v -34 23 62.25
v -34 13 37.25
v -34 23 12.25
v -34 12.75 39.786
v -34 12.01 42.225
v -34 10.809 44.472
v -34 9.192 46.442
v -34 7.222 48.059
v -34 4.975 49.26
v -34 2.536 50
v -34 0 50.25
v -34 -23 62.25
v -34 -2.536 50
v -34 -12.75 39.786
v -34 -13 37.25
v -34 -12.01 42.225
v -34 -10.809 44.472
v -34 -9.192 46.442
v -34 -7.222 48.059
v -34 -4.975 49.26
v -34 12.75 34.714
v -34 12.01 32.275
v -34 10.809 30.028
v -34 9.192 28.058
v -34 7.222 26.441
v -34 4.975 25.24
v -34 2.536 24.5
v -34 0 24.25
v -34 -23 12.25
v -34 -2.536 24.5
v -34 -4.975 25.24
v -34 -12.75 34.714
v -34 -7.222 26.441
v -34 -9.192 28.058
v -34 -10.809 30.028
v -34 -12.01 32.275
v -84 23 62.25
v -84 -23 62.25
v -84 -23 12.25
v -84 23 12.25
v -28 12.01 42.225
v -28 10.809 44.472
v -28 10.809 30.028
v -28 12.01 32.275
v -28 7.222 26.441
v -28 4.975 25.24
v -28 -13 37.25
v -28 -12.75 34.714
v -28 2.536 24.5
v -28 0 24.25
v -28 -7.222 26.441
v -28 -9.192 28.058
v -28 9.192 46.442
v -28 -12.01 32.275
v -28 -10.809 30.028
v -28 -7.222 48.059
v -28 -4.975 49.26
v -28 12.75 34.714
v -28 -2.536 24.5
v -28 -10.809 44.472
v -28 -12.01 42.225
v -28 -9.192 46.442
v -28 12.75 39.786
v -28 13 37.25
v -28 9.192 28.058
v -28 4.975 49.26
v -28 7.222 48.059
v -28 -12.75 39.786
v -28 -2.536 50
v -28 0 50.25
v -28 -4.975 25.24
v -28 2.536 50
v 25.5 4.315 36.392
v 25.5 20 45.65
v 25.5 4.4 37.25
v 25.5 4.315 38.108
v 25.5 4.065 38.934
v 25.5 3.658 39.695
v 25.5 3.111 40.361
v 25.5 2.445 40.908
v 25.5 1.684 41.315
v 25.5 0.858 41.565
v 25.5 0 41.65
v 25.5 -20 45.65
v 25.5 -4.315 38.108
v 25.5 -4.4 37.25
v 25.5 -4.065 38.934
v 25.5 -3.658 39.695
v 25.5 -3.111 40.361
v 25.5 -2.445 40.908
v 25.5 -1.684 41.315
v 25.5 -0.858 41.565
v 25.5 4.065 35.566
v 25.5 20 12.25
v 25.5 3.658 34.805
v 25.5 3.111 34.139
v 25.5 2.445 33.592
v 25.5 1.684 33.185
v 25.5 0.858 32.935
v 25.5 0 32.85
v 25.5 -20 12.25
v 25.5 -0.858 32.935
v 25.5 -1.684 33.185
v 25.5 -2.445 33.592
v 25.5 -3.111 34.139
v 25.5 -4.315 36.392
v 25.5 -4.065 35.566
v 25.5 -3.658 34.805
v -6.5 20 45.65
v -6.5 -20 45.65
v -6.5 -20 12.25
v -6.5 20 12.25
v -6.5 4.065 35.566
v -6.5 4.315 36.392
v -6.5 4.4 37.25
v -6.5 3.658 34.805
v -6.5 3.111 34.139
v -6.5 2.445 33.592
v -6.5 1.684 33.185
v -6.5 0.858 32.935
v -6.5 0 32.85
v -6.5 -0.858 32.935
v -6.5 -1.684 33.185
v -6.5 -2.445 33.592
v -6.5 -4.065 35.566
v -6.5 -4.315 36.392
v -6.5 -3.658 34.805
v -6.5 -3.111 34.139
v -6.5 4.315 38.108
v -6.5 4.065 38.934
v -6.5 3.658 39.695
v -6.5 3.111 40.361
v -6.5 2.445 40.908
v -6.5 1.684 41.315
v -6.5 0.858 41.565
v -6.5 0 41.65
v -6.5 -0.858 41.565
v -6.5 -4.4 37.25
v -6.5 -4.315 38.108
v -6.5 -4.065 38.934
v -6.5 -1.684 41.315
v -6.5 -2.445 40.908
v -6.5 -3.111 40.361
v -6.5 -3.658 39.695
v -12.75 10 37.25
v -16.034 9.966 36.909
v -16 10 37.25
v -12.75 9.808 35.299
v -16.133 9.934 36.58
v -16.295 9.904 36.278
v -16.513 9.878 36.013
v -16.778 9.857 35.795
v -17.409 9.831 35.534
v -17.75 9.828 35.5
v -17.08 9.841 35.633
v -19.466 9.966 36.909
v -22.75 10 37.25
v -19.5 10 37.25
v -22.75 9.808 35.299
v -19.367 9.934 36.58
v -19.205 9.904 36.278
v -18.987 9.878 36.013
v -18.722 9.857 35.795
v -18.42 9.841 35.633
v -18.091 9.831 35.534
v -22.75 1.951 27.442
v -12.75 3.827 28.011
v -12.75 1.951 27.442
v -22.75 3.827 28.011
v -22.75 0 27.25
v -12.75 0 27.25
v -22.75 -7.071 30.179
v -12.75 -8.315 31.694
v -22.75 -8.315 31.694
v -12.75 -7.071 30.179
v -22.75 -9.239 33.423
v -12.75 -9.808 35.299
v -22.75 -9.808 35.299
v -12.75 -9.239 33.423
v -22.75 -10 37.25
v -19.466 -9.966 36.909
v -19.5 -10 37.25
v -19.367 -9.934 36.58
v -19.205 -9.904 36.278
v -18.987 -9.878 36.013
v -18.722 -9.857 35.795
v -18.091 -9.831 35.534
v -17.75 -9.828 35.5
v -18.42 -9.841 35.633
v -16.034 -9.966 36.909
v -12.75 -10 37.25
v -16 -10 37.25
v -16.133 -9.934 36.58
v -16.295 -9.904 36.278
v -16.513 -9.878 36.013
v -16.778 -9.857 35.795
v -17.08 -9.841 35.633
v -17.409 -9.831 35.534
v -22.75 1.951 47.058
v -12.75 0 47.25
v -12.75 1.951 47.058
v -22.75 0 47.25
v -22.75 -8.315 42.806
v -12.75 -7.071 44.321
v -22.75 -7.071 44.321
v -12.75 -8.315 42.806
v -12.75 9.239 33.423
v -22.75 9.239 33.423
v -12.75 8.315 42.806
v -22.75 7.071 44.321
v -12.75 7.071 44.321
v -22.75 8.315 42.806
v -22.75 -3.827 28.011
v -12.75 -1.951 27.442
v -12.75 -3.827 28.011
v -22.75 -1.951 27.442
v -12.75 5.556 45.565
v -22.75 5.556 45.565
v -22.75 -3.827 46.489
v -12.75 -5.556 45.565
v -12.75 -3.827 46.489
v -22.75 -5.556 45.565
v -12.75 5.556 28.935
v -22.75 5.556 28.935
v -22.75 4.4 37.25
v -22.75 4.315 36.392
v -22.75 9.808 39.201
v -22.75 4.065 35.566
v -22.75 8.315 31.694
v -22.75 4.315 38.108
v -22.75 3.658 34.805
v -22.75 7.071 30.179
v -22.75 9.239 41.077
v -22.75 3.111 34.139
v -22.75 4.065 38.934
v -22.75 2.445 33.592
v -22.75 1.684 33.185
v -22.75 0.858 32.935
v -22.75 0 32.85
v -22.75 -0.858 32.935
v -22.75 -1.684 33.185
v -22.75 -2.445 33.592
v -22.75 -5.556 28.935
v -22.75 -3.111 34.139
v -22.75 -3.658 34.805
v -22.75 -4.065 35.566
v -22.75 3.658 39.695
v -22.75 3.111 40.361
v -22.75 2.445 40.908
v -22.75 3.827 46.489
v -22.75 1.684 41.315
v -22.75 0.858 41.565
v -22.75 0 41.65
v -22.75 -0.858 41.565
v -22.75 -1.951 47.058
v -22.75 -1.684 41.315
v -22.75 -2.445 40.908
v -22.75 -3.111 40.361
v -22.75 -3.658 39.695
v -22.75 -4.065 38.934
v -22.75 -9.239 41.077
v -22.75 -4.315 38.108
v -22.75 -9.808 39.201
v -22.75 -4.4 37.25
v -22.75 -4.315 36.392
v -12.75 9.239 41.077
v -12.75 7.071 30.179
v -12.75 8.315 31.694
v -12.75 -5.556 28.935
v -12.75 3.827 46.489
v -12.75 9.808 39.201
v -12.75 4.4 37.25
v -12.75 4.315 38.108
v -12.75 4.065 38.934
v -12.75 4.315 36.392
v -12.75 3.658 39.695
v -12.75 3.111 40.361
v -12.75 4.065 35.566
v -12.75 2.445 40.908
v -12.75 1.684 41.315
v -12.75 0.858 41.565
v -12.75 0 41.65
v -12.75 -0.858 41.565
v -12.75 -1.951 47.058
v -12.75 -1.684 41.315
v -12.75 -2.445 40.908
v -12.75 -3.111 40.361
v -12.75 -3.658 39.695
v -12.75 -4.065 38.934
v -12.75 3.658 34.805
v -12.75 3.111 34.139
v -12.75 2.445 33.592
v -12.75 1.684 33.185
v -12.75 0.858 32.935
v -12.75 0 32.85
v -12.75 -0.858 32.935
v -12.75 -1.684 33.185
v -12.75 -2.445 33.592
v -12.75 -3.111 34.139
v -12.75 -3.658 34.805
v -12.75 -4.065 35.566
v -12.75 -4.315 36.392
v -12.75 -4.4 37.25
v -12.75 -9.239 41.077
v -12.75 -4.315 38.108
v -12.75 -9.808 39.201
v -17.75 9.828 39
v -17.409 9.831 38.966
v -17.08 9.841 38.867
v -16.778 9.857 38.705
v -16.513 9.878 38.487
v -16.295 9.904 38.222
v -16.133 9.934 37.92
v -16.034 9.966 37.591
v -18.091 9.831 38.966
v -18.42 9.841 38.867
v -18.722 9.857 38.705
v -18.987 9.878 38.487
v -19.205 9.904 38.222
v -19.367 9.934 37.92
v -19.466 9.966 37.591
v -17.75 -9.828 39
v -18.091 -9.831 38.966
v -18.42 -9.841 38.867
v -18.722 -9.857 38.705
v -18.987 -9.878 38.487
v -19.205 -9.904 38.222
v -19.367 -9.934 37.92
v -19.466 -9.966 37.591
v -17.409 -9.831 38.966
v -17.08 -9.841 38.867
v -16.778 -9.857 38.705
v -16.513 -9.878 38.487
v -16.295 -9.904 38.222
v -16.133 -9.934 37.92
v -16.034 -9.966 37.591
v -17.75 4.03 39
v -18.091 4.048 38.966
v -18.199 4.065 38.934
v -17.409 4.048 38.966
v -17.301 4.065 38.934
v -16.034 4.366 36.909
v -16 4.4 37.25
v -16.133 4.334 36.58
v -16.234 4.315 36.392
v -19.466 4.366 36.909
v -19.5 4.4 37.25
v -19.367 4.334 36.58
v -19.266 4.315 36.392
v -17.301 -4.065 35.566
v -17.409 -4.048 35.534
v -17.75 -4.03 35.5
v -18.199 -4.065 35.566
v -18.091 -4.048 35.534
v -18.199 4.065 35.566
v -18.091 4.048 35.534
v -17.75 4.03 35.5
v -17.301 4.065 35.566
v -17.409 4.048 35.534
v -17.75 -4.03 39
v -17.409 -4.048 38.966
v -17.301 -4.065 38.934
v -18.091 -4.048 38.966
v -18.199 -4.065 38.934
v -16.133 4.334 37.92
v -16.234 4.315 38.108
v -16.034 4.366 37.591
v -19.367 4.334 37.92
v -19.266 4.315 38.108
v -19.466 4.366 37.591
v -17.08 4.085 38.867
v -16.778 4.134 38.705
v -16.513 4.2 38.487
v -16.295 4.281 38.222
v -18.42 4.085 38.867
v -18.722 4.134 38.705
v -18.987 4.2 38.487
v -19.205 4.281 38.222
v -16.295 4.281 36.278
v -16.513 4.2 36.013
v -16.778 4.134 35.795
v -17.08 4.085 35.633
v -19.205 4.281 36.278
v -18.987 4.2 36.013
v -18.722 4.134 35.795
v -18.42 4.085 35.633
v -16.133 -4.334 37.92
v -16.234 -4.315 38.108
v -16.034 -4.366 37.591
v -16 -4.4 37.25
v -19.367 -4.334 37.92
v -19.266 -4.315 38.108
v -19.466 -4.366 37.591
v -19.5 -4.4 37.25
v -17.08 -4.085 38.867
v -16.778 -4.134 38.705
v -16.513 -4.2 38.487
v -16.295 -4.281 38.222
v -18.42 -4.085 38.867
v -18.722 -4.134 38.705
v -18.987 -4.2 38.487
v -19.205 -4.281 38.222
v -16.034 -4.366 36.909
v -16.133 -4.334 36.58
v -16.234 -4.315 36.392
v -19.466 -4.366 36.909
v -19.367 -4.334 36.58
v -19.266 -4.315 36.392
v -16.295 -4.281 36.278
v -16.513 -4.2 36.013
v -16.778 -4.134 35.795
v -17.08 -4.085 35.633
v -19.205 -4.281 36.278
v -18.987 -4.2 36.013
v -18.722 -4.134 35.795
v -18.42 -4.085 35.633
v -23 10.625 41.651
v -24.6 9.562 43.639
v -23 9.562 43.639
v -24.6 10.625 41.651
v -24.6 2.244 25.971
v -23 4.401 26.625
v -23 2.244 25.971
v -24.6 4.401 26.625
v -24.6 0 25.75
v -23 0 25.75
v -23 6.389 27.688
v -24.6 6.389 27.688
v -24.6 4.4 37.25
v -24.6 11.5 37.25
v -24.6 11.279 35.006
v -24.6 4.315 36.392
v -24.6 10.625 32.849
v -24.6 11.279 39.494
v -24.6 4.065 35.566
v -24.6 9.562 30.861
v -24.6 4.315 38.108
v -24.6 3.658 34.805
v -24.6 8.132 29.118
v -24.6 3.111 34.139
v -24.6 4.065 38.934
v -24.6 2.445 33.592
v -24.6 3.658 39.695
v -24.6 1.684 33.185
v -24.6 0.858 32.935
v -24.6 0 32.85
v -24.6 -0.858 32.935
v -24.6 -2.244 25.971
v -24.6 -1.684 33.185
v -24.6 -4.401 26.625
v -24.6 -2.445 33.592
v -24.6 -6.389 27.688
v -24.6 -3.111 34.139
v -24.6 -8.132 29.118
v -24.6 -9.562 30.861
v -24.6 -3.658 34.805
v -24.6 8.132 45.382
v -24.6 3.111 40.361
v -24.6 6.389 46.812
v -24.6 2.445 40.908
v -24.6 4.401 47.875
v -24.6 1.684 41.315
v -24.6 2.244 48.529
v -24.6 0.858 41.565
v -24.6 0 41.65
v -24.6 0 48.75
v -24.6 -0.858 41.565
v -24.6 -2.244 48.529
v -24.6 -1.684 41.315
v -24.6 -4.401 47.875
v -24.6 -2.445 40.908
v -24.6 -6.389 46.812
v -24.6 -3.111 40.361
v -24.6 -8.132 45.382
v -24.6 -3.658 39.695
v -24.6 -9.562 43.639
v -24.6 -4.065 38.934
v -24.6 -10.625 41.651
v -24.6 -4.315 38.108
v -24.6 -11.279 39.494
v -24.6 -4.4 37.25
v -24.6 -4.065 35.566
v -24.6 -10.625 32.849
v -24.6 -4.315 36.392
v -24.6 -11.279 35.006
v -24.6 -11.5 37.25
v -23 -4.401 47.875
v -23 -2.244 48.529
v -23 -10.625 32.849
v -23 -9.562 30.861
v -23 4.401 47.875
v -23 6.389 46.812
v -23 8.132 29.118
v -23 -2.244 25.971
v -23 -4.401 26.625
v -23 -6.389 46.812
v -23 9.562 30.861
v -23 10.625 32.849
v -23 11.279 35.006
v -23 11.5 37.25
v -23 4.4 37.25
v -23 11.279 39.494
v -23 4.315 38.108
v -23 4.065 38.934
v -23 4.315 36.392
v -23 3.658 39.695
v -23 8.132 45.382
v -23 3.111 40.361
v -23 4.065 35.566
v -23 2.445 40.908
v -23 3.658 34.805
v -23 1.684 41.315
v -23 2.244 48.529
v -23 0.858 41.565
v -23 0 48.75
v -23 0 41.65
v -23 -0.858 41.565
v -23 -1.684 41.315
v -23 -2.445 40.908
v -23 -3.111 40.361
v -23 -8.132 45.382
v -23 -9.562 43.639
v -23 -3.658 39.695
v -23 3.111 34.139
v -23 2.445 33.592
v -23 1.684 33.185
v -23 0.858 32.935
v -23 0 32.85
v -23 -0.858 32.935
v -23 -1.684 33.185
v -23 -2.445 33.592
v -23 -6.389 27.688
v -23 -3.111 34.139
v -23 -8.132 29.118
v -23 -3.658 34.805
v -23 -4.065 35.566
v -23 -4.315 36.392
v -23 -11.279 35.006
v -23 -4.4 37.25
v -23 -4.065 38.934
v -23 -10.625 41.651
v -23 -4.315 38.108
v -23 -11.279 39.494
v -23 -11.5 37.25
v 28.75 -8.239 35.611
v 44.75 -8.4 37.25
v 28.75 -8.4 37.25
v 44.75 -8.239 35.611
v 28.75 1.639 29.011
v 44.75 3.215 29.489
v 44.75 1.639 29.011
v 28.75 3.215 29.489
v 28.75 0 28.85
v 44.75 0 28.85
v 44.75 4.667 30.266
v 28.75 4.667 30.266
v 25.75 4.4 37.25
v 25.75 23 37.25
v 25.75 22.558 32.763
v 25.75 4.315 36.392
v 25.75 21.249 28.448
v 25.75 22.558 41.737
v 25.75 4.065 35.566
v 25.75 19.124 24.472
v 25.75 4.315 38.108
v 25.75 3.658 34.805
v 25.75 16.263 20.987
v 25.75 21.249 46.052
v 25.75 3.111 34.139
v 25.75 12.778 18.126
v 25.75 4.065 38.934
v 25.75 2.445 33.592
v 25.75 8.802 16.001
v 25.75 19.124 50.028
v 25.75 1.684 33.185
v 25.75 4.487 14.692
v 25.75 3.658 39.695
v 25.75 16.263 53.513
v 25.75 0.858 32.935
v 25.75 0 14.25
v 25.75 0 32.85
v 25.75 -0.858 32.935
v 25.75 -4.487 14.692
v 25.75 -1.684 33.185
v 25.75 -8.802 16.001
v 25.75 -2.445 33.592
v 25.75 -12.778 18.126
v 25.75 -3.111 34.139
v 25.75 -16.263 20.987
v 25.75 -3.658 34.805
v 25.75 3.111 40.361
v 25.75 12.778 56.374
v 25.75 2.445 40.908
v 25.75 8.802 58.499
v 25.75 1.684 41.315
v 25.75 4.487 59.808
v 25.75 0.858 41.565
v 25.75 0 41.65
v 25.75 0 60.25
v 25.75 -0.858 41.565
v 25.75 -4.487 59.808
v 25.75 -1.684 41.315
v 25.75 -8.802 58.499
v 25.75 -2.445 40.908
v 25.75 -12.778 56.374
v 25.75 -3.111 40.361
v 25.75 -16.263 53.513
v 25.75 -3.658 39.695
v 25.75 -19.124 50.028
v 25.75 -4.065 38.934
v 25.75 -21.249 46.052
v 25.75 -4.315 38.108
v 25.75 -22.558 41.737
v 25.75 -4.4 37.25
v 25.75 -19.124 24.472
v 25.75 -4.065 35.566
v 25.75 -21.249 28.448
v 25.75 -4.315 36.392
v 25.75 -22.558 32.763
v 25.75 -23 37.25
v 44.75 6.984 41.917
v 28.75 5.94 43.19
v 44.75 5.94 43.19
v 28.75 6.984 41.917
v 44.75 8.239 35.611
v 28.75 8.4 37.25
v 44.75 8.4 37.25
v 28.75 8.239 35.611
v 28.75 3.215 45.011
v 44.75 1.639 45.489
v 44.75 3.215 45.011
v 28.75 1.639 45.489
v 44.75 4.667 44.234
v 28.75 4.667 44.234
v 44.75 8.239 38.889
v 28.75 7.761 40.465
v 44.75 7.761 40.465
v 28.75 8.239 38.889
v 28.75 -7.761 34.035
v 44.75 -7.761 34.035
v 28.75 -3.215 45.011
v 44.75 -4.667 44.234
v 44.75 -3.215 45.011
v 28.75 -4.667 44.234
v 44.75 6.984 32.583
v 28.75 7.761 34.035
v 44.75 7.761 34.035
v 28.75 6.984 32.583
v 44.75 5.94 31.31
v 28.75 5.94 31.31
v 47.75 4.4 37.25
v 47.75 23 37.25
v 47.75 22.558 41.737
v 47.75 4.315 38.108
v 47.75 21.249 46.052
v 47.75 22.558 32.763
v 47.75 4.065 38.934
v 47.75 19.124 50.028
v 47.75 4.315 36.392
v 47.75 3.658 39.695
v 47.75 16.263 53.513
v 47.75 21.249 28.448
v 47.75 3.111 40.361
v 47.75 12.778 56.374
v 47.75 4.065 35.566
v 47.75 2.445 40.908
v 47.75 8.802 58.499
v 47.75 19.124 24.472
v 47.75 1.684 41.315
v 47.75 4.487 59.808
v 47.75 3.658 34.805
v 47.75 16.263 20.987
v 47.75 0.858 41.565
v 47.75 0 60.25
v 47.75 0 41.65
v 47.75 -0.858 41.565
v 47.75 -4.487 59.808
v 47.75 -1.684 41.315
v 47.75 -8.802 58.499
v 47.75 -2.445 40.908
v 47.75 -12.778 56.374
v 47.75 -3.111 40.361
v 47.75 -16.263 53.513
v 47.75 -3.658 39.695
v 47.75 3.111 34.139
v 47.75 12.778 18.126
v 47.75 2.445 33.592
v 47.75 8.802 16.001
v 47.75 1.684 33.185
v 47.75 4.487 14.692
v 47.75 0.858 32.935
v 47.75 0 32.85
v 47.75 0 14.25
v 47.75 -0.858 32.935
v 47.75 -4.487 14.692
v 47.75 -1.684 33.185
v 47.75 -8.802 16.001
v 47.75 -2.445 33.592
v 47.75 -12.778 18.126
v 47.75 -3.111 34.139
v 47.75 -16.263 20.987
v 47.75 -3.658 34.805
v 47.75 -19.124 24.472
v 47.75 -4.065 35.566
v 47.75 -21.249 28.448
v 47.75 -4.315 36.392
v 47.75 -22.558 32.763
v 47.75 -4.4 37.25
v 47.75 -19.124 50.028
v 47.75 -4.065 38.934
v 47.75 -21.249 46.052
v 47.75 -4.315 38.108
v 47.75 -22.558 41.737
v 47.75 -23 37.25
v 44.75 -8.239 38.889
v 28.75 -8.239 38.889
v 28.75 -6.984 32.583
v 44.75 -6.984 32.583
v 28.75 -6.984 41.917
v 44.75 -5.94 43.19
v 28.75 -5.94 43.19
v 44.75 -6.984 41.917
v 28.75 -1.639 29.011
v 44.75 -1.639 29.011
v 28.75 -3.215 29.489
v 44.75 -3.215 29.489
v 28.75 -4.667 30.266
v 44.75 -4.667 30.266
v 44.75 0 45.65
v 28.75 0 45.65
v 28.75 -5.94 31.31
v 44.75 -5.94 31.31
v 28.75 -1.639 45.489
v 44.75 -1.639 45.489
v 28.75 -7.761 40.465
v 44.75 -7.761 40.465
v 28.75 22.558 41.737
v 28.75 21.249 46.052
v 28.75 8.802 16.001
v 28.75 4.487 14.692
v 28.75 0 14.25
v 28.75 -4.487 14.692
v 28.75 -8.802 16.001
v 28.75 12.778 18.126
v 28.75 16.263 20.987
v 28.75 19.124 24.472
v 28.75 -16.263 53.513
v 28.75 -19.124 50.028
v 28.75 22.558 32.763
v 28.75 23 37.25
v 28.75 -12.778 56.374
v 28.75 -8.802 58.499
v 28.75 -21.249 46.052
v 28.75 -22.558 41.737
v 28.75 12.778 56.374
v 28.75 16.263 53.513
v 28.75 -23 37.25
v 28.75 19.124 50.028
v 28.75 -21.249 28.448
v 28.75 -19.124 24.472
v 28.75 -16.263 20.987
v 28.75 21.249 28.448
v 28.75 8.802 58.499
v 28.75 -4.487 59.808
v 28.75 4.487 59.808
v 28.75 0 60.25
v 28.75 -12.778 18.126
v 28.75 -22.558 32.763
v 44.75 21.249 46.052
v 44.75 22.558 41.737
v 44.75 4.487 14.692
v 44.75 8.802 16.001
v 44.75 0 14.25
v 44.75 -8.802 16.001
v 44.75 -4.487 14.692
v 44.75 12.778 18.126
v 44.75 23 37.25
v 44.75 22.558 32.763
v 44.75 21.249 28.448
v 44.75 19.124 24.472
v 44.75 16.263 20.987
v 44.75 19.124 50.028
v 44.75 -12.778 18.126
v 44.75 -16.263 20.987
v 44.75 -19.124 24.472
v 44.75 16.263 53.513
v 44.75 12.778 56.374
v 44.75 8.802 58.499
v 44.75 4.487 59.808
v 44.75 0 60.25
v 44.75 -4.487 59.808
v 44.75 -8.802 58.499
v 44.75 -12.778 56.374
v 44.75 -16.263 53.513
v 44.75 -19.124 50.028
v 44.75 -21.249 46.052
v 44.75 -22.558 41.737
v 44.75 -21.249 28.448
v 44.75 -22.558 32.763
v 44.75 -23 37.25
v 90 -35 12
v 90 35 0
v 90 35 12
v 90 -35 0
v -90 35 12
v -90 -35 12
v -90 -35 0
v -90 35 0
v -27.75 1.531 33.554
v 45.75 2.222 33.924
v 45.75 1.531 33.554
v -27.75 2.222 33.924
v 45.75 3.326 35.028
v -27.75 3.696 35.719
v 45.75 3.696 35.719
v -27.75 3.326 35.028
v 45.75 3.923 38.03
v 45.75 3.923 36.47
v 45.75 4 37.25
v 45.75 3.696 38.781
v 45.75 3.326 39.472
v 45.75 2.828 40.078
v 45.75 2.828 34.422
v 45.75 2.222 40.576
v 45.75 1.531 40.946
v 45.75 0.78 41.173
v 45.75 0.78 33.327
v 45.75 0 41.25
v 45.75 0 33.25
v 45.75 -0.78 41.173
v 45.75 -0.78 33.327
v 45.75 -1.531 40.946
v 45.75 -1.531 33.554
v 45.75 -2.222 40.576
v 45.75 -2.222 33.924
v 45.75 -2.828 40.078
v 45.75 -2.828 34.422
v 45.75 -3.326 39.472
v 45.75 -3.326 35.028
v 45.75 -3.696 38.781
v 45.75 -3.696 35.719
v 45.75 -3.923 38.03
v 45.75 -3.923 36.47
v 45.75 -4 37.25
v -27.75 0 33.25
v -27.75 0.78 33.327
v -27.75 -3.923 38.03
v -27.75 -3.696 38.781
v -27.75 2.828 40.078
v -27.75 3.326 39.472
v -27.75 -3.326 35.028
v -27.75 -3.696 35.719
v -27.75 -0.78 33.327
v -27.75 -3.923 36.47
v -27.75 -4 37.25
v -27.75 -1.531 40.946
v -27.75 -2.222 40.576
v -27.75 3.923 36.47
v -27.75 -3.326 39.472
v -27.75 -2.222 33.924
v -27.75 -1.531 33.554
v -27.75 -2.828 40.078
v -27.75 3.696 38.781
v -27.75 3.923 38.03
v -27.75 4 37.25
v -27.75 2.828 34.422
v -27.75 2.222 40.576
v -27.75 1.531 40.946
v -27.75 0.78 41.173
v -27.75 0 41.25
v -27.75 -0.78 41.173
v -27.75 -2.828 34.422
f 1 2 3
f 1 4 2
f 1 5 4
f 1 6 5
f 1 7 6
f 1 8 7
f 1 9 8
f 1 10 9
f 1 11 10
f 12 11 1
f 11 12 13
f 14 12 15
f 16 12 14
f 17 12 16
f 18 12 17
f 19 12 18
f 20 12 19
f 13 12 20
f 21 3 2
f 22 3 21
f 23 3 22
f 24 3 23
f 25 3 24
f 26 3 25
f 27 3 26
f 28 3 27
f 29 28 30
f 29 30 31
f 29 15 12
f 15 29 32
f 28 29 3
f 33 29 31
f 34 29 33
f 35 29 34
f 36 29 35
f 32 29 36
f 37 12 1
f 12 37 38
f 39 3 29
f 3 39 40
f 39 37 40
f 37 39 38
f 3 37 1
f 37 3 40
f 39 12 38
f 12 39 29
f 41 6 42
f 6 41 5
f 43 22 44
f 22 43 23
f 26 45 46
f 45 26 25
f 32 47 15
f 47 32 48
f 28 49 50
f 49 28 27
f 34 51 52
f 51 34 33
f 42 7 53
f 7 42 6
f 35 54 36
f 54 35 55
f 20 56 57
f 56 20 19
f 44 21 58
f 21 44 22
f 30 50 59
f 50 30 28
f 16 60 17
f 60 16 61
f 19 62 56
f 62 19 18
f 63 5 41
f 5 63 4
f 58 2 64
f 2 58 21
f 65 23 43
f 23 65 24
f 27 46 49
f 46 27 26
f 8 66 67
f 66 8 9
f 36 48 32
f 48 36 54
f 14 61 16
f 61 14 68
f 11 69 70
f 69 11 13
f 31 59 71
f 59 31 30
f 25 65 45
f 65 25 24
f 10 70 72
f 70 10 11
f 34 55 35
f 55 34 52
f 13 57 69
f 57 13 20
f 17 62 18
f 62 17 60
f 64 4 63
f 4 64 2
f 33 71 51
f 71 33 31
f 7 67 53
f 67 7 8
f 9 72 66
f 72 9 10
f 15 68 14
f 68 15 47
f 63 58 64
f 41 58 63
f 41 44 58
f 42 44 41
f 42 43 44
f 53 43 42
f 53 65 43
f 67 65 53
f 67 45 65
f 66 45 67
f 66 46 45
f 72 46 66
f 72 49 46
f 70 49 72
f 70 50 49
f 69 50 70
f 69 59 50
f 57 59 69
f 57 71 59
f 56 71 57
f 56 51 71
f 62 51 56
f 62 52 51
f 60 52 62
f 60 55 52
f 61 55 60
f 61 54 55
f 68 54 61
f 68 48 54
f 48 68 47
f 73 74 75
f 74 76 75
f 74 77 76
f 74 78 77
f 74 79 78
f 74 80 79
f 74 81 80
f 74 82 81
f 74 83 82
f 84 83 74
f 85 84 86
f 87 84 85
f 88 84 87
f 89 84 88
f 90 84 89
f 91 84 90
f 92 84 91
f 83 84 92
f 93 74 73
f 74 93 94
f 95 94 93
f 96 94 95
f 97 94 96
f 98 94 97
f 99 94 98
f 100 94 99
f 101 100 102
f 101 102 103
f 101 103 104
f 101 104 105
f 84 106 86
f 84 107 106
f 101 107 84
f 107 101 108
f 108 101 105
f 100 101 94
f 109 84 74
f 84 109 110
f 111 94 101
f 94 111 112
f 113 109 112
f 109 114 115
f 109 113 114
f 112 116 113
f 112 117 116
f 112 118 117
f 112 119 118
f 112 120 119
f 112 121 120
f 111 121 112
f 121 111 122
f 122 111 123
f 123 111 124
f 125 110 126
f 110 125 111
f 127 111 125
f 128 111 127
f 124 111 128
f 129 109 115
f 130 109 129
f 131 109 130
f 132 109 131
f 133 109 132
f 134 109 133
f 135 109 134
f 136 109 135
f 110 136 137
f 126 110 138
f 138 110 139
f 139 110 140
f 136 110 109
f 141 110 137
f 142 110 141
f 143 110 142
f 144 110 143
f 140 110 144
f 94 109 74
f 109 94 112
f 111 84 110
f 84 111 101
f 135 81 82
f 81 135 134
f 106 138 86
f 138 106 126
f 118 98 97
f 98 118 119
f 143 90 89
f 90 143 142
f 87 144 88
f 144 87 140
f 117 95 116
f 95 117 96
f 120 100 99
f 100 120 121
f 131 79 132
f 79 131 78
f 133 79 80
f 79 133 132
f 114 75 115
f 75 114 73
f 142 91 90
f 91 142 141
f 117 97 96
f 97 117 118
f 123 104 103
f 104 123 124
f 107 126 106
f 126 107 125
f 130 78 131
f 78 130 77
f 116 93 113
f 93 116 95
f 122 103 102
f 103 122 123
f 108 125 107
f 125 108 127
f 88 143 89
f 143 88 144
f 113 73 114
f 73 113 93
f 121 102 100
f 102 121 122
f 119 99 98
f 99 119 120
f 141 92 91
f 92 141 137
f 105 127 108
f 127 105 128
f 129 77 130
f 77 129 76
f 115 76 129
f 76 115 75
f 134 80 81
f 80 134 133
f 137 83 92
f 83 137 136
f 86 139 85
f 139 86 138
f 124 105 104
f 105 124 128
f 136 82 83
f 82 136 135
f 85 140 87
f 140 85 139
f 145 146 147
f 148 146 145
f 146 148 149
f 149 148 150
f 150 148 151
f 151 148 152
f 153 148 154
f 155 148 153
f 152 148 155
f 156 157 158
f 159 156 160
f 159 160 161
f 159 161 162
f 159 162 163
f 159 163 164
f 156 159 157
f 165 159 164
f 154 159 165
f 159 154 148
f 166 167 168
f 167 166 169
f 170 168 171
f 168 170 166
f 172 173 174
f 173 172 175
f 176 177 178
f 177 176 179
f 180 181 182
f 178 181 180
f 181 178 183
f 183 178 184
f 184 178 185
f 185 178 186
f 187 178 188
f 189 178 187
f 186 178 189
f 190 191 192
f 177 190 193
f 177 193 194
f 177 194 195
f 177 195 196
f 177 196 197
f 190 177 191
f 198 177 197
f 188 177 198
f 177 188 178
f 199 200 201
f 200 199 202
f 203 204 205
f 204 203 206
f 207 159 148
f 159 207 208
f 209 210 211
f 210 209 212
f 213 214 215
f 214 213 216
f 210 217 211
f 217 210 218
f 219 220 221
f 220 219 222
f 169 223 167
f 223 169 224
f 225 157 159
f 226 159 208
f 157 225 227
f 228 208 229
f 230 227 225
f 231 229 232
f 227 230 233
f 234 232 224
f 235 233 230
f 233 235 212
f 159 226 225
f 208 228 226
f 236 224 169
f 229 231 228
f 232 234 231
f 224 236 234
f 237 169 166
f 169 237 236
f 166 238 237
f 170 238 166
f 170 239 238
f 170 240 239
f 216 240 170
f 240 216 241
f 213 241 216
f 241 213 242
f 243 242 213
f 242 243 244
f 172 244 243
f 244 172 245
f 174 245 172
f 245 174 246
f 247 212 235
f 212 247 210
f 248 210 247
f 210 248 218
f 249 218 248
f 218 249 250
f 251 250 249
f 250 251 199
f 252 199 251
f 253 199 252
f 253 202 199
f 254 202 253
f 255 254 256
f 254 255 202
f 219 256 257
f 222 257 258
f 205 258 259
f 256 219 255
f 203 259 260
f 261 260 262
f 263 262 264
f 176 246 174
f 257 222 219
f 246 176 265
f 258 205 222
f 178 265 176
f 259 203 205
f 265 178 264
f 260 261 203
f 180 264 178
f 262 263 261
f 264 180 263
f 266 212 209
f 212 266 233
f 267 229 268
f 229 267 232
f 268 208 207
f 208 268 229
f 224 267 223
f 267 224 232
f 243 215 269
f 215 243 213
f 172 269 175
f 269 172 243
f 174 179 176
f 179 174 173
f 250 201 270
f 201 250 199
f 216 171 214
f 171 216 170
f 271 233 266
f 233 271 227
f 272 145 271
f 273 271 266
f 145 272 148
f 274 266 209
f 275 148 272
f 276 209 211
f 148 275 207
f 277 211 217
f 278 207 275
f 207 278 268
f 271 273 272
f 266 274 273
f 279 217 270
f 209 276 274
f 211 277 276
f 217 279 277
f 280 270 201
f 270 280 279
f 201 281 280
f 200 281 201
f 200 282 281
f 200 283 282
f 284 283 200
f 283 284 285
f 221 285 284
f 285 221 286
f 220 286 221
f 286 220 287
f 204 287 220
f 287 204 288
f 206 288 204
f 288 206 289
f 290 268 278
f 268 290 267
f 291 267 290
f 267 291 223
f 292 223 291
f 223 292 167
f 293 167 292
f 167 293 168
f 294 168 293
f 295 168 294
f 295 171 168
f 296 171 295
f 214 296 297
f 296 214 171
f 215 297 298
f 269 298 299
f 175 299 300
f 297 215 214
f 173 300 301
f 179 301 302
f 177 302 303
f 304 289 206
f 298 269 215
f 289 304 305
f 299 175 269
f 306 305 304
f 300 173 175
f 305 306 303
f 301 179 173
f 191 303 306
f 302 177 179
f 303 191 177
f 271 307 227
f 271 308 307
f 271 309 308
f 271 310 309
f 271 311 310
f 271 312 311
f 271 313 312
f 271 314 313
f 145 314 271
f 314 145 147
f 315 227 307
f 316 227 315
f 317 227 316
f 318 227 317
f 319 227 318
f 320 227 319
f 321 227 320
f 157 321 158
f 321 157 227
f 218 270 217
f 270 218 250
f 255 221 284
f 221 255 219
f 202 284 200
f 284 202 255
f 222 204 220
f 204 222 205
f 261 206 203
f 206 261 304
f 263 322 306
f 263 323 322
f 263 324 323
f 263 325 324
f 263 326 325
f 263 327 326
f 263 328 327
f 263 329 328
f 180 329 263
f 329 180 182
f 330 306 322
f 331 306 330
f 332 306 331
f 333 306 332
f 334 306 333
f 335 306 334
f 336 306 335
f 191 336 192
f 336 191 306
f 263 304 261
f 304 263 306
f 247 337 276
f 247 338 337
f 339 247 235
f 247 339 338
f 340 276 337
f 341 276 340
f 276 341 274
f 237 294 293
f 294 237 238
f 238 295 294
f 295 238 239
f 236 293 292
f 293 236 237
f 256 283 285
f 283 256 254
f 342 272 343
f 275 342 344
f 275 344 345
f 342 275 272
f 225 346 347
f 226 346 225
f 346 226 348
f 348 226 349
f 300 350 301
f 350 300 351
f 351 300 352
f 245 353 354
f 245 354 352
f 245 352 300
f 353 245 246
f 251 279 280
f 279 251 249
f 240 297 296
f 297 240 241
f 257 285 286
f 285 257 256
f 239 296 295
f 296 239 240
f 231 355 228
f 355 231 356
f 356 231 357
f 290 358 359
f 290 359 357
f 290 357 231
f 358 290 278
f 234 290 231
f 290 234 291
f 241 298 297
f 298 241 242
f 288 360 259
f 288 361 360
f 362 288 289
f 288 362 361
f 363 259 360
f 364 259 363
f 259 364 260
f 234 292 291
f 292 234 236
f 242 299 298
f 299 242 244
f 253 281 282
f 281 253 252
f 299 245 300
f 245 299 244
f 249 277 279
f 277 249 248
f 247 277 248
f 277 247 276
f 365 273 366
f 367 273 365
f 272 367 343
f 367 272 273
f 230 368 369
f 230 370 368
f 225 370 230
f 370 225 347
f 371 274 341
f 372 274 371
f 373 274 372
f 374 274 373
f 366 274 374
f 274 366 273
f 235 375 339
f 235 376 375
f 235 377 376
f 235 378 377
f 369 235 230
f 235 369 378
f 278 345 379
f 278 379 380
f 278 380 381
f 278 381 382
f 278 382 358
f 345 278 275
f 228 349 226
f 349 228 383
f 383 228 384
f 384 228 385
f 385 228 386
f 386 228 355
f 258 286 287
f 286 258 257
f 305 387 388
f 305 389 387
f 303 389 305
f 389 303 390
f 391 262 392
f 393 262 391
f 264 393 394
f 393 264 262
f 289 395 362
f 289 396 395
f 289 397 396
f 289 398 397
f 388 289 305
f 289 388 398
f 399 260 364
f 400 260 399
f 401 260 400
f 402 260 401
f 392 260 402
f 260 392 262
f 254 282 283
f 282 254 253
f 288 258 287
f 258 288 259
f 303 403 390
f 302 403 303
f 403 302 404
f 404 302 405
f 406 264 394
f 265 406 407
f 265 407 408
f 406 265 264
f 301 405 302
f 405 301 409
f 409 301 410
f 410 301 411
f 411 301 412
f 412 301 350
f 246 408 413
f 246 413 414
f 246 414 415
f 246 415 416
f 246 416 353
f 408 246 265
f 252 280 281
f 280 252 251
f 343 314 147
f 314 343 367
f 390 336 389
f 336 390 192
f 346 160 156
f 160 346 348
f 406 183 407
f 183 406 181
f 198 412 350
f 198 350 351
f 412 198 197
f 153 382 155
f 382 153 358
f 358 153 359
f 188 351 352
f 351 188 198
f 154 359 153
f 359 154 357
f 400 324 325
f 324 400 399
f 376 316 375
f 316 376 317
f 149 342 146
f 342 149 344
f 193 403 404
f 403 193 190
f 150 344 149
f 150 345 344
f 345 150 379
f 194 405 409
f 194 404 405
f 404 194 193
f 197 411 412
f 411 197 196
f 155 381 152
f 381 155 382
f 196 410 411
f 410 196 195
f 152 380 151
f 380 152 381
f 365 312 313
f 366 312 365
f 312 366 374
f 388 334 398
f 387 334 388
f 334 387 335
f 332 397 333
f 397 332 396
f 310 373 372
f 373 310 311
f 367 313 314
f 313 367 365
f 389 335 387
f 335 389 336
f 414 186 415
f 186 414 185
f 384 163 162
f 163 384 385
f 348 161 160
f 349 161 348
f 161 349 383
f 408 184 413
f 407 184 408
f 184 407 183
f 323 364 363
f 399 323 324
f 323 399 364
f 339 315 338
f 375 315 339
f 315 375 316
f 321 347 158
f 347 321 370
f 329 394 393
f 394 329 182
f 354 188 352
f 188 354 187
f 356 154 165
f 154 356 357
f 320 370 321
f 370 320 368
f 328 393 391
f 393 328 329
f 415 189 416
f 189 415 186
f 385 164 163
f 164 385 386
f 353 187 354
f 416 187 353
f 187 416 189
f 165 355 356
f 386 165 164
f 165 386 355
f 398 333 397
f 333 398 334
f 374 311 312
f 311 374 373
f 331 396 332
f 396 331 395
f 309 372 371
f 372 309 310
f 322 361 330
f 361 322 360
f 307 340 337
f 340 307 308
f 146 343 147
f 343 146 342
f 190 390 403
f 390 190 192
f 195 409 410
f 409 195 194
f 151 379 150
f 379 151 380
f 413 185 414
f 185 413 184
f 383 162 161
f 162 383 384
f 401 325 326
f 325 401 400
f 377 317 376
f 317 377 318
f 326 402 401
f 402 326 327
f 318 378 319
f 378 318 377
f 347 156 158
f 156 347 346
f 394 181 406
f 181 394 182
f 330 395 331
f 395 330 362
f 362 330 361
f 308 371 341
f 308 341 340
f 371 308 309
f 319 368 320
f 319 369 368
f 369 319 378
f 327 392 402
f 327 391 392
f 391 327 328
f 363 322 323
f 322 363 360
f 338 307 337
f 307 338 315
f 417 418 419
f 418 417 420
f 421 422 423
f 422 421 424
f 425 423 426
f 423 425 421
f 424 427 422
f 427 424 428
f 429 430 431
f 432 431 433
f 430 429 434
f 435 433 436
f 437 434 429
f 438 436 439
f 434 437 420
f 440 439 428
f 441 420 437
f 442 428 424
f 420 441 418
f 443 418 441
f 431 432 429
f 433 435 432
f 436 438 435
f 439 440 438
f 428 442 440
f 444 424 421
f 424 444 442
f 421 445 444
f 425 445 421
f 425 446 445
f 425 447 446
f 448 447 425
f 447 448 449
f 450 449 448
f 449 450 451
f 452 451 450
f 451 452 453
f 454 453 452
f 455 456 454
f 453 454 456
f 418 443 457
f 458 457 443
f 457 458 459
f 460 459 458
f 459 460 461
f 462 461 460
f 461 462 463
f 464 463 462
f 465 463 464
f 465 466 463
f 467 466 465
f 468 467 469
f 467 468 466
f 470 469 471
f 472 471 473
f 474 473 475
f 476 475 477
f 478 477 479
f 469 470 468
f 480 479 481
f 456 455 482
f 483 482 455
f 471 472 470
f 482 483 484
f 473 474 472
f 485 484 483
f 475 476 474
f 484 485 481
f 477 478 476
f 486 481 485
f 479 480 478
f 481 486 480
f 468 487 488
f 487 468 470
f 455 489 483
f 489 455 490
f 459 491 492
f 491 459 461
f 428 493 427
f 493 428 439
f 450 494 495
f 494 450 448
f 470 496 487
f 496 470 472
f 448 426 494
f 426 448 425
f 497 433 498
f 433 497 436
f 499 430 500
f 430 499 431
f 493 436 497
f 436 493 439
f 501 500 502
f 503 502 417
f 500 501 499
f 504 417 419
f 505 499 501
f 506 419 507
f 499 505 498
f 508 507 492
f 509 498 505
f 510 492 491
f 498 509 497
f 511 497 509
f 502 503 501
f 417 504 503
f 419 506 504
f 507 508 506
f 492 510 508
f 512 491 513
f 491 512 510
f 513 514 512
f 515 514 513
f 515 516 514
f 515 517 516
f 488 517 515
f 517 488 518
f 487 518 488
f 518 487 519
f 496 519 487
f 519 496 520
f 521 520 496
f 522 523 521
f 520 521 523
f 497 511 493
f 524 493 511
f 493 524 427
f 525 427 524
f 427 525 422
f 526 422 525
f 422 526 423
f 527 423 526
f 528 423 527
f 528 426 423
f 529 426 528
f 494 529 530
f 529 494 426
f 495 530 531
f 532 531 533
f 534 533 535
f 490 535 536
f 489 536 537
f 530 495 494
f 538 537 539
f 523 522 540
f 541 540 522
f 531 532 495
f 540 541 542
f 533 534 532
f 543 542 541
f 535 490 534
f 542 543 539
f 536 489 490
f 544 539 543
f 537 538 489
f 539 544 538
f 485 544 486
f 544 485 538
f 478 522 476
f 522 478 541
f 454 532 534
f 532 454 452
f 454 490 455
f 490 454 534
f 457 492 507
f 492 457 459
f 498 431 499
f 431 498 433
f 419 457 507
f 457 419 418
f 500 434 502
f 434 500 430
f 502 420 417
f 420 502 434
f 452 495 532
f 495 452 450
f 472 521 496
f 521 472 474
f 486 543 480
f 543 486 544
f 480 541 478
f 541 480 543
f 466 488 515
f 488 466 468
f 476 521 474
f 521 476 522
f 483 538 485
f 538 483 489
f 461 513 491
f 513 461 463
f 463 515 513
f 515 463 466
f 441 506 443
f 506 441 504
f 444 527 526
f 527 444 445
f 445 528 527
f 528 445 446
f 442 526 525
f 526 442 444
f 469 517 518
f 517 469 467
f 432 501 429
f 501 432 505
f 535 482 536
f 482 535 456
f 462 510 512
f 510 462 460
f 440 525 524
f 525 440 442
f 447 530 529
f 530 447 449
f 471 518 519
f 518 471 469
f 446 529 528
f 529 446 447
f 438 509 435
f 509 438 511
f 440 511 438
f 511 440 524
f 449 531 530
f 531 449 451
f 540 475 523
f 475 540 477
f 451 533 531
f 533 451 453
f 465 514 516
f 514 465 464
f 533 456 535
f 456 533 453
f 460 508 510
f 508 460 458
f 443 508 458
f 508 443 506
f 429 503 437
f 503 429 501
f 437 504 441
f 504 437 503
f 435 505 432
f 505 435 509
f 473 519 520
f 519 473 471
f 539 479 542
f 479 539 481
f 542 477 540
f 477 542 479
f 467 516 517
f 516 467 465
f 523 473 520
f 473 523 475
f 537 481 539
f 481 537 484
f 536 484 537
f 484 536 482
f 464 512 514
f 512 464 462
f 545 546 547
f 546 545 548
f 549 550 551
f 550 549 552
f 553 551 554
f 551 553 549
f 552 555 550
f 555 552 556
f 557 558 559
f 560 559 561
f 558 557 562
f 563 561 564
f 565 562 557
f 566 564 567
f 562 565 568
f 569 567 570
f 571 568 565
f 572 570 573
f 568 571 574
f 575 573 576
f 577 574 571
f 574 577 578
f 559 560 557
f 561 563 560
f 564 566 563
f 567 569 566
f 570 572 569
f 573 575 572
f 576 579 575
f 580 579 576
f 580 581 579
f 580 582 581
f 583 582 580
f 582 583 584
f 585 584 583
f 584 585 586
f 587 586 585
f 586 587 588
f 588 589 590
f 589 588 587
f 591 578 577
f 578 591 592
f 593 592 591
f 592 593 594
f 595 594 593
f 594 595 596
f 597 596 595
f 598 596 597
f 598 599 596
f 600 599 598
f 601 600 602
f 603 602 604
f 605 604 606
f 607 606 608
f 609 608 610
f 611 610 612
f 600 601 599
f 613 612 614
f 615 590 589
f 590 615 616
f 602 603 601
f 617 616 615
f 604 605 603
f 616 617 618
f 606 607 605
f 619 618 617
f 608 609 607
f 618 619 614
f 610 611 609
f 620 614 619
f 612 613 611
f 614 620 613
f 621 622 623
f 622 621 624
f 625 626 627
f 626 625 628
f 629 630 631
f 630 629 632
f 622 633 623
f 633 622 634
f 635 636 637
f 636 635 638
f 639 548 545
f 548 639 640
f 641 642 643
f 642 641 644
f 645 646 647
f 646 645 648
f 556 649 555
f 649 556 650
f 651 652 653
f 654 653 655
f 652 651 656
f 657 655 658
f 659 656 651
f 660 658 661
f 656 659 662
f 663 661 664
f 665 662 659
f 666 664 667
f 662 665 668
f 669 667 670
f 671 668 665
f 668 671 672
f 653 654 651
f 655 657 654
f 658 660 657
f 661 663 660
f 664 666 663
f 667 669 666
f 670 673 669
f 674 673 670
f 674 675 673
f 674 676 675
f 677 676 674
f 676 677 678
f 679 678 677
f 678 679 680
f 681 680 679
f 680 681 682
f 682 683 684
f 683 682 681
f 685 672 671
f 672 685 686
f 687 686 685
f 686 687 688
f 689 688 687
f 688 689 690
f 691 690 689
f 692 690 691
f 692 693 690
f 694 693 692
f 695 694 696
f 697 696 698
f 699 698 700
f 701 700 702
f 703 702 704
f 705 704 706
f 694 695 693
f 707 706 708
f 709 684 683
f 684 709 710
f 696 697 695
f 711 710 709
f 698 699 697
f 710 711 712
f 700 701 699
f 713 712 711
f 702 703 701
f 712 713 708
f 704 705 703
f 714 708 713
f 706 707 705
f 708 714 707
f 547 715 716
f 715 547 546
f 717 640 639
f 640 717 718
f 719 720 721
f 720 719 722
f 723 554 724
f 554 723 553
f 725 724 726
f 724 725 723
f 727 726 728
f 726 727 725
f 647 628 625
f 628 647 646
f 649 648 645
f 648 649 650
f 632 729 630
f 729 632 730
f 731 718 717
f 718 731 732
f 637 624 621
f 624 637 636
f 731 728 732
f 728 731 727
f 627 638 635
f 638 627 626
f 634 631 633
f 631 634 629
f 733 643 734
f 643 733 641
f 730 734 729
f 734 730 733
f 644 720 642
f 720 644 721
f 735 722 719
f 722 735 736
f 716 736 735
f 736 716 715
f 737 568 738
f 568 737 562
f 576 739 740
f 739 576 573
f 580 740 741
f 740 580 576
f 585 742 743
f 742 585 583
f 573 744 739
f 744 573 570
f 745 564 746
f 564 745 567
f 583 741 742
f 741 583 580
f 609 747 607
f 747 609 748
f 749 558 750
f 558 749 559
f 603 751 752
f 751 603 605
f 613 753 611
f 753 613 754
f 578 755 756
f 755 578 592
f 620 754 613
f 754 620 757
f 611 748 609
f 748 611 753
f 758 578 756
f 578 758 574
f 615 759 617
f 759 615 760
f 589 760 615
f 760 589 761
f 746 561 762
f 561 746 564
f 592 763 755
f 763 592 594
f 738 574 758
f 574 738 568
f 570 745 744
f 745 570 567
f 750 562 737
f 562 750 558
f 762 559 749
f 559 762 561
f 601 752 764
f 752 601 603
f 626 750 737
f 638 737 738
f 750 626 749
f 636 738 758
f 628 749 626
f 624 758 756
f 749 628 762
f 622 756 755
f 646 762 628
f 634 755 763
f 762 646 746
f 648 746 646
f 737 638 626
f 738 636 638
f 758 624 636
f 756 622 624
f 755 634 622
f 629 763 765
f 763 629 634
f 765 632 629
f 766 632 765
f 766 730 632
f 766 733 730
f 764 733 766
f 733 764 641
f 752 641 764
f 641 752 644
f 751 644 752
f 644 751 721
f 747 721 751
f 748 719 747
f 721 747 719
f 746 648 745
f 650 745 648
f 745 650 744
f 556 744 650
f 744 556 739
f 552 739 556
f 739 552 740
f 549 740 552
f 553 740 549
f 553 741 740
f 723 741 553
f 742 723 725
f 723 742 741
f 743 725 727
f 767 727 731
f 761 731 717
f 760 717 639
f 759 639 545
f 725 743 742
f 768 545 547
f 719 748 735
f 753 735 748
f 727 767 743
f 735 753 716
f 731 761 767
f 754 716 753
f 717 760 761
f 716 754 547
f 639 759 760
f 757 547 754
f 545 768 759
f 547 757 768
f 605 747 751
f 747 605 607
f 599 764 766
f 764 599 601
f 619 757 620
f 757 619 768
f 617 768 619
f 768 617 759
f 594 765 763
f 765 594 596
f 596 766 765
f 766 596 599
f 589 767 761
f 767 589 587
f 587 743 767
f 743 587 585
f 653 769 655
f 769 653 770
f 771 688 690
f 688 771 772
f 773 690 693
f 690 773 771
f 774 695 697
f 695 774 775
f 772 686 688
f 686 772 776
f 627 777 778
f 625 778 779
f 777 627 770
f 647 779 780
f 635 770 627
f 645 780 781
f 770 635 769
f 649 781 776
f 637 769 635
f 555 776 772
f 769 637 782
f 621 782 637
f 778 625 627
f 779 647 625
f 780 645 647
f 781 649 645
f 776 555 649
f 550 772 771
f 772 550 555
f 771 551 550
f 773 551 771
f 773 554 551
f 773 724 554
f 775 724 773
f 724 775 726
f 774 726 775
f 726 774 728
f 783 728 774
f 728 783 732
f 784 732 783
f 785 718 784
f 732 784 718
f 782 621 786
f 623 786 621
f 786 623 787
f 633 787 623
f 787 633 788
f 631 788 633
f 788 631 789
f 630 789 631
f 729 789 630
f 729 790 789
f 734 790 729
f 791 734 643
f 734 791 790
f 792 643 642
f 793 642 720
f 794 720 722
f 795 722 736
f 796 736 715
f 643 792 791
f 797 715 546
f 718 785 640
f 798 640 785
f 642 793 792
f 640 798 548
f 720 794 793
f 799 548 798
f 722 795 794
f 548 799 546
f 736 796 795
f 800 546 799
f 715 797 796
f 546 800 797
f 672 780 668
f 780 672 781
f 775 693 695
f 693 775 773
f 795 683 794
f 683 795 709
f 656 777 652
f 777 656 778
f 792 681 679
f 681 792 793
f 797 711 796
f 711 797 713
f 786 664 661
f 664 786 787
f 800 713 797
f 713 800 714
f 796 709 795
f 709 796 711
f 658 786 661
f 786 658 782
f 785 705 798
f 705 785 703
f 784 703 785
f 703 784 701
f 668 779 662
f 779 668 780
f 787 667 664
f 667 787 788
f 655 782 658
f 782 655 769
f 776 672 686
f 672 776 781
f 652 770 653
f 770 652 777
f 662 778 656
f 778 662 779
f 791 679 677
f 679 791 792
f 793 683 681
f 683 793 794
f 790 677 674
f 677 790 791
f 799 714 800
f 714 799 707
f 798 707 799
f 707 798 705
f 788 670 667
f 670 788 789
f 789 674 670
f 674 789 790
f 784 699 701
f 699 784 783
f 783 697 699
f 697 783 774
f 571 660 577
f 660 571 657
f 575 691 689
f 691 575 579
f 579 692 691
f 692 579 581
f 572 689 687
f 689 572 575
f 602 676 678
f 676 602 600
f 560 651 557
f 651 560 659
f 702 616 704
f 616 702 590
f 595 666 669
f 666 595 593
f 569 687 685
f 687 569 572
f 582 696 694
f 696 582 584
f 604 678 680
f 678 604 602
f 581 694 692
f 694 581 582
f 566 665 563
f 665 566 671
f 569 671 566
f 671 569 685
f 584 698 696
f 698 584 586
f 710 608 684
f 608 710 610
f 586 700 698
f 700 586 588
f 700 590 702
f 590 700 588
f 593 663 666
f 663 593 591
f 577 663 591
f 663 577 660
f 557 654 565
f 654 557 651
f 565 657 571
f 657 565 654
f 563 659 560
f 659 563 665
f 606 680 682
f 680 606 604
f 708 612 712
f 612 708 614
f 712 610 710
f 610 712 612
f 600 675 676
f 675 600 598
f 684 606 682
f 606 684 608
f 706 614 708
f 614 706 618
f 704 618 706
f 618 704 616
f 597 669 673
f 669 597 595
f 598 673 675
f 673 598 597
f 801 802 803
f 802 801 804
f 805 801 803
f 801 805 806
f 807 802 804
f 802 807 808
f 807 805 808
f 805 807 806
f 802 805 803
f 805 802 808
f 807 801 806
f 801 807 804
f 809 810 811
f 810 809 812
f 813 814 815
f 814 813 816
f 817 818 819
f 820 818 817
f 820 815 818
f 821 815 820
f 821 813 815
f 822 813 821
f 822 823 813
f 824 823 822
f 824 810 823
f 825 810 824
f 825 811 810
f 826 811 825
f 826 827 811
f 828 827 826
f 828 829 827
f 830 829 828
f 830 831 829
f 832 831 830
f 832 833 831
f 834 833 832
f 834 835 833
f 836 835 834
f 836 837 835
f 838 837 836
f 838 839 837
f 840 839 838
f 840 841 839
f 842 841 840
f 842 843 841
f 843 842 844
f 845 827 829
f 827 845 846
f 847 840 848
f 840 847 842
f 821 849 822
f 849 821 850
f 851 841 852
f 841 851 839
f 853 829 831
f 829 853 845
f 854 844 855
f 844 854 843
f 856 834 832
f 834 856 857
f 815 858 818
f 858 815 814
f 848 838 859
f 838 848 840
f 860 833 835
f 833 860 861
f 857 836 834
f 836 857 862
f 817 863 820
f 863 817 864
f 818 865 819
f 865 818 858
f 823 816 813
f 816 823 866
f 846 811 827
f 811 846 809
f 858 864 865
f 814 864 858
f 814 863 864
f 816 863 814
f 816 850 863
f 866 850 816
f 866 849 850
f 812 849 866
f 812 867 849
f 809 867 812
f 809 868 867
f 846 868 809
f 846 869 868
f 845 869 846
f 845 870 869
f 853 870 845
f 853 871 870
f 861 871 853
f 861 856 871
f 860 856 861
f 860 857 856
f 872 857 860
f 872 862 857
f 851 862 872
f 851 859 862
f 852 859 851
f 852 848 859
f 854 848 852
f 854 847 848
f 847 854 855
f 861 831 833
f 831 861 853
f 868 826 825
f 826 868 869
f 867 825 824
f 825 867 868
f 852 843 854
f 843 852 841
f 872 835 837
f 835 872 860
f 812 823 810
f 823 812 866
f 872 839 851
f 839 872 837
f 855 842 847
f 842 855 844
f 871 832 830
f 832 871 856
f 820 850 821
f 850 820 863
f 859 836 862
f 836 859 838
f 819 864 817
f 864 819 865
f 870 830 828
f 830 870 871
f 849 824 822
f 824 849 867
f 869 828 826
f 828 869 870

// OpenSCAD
$fn = 32;

// ------------------------------------------------------------------------
// Motor drive station: motor 50 x 50 mm, shaft d8, pulley d46
// Every part is its own module, assembly() places every instance.
// ------------------------------------------------------------------------

// --- part 1 ---
module station_bed() {
  difference() {
    translate([-90, -35, 0]) cube([180, 70, 12]);
  }
}

// --- part 2 ---
module drive_motor() {
  union() {
    translate([-25, -23, 0]) cube([50, 46, 50]);
    translate([28, 0, 25]) rotate([0, 90, 0]) cylinder(h = 6, d = 26, center = true);
  }
}

// --- part 3 ---
module pillow_block() {
  difference() {
    translate([-16, -20, 0]) cube([32, 40, 33.4]);
    translate([0, 0, 25]) rotate([0, 90, 0]) cylinder(h = 34, d = 8.8, center = true);
  }
}

// --- part 4 ---
module drive_shaft() {
  translate([0, 0, -36.75]) cylinder(h = 73.5, d = 8);
}

// --- part 5 ---
module shaft_collar() {
  difference() {
    cylinder(h = 10, d = 20);
    translate([0, 0, -1]) cylinder(h = 12, d = 8.8);
    translate([0, 0, 5]) rotate([90, 0, 0]) cylinder(h = 22, d = 3.5, center = true);
  }
}

// --- part 6 ---
module collar_washer() {
  difference() {
      translate([0, 0, 0]) cylinder(h = 1.6, d = 23);
      translate([0, 0, -1]) cylinder(h = 3.6, d = 8.8);
    }
}

// --- part 7 ---
module drive_pulley() {
  difference() {
    union() {
      cylinder(h = 22, d = 16.8);
      cylinder(h = 3, d = 46);
      translate([0, 0, 19]) cylinder(h = 3, d = 46);
    }
    translate([0, 0, -1]) cylinder(h = 24, d = 8.8);
  }
}

// --- assembly ---
module assembly() {
  color([0.80, 0.24, 0.20]) translate([0, 0, 0]) rotate([0, 0, 0]) station_bed();
  color([0.20, 0.45, 0.75]) translate([-59, 0, 12.25]) rotate([0, 0, 0]) drive_motor();
  color([0.25, 0.62, 0.32]) translate([9.5, 0, 12.25]) rotate([0, 0, 0]) pillow_block();
  color([0.92, 0.70, 0.18]) translate([9, 0, 37.25]) rotate([0, 90, 0]) drive_shaft();
  color([0.58, 0.35, 0.70]) translate([-22.75, 0, 37.25]) rotate([0, 90, 0]) shaft_collar();
  color([0.16, 0.66, 0.66]) translate([-24.6, 0, 37.25]) rotate([0, 90, 0]) collar_washer();
  color([0.85, 0.48, 0.18]) translate([25.75, 0, 37.25]) rotate([0, 90, 0]) drive_pulley();
}

assembly();
